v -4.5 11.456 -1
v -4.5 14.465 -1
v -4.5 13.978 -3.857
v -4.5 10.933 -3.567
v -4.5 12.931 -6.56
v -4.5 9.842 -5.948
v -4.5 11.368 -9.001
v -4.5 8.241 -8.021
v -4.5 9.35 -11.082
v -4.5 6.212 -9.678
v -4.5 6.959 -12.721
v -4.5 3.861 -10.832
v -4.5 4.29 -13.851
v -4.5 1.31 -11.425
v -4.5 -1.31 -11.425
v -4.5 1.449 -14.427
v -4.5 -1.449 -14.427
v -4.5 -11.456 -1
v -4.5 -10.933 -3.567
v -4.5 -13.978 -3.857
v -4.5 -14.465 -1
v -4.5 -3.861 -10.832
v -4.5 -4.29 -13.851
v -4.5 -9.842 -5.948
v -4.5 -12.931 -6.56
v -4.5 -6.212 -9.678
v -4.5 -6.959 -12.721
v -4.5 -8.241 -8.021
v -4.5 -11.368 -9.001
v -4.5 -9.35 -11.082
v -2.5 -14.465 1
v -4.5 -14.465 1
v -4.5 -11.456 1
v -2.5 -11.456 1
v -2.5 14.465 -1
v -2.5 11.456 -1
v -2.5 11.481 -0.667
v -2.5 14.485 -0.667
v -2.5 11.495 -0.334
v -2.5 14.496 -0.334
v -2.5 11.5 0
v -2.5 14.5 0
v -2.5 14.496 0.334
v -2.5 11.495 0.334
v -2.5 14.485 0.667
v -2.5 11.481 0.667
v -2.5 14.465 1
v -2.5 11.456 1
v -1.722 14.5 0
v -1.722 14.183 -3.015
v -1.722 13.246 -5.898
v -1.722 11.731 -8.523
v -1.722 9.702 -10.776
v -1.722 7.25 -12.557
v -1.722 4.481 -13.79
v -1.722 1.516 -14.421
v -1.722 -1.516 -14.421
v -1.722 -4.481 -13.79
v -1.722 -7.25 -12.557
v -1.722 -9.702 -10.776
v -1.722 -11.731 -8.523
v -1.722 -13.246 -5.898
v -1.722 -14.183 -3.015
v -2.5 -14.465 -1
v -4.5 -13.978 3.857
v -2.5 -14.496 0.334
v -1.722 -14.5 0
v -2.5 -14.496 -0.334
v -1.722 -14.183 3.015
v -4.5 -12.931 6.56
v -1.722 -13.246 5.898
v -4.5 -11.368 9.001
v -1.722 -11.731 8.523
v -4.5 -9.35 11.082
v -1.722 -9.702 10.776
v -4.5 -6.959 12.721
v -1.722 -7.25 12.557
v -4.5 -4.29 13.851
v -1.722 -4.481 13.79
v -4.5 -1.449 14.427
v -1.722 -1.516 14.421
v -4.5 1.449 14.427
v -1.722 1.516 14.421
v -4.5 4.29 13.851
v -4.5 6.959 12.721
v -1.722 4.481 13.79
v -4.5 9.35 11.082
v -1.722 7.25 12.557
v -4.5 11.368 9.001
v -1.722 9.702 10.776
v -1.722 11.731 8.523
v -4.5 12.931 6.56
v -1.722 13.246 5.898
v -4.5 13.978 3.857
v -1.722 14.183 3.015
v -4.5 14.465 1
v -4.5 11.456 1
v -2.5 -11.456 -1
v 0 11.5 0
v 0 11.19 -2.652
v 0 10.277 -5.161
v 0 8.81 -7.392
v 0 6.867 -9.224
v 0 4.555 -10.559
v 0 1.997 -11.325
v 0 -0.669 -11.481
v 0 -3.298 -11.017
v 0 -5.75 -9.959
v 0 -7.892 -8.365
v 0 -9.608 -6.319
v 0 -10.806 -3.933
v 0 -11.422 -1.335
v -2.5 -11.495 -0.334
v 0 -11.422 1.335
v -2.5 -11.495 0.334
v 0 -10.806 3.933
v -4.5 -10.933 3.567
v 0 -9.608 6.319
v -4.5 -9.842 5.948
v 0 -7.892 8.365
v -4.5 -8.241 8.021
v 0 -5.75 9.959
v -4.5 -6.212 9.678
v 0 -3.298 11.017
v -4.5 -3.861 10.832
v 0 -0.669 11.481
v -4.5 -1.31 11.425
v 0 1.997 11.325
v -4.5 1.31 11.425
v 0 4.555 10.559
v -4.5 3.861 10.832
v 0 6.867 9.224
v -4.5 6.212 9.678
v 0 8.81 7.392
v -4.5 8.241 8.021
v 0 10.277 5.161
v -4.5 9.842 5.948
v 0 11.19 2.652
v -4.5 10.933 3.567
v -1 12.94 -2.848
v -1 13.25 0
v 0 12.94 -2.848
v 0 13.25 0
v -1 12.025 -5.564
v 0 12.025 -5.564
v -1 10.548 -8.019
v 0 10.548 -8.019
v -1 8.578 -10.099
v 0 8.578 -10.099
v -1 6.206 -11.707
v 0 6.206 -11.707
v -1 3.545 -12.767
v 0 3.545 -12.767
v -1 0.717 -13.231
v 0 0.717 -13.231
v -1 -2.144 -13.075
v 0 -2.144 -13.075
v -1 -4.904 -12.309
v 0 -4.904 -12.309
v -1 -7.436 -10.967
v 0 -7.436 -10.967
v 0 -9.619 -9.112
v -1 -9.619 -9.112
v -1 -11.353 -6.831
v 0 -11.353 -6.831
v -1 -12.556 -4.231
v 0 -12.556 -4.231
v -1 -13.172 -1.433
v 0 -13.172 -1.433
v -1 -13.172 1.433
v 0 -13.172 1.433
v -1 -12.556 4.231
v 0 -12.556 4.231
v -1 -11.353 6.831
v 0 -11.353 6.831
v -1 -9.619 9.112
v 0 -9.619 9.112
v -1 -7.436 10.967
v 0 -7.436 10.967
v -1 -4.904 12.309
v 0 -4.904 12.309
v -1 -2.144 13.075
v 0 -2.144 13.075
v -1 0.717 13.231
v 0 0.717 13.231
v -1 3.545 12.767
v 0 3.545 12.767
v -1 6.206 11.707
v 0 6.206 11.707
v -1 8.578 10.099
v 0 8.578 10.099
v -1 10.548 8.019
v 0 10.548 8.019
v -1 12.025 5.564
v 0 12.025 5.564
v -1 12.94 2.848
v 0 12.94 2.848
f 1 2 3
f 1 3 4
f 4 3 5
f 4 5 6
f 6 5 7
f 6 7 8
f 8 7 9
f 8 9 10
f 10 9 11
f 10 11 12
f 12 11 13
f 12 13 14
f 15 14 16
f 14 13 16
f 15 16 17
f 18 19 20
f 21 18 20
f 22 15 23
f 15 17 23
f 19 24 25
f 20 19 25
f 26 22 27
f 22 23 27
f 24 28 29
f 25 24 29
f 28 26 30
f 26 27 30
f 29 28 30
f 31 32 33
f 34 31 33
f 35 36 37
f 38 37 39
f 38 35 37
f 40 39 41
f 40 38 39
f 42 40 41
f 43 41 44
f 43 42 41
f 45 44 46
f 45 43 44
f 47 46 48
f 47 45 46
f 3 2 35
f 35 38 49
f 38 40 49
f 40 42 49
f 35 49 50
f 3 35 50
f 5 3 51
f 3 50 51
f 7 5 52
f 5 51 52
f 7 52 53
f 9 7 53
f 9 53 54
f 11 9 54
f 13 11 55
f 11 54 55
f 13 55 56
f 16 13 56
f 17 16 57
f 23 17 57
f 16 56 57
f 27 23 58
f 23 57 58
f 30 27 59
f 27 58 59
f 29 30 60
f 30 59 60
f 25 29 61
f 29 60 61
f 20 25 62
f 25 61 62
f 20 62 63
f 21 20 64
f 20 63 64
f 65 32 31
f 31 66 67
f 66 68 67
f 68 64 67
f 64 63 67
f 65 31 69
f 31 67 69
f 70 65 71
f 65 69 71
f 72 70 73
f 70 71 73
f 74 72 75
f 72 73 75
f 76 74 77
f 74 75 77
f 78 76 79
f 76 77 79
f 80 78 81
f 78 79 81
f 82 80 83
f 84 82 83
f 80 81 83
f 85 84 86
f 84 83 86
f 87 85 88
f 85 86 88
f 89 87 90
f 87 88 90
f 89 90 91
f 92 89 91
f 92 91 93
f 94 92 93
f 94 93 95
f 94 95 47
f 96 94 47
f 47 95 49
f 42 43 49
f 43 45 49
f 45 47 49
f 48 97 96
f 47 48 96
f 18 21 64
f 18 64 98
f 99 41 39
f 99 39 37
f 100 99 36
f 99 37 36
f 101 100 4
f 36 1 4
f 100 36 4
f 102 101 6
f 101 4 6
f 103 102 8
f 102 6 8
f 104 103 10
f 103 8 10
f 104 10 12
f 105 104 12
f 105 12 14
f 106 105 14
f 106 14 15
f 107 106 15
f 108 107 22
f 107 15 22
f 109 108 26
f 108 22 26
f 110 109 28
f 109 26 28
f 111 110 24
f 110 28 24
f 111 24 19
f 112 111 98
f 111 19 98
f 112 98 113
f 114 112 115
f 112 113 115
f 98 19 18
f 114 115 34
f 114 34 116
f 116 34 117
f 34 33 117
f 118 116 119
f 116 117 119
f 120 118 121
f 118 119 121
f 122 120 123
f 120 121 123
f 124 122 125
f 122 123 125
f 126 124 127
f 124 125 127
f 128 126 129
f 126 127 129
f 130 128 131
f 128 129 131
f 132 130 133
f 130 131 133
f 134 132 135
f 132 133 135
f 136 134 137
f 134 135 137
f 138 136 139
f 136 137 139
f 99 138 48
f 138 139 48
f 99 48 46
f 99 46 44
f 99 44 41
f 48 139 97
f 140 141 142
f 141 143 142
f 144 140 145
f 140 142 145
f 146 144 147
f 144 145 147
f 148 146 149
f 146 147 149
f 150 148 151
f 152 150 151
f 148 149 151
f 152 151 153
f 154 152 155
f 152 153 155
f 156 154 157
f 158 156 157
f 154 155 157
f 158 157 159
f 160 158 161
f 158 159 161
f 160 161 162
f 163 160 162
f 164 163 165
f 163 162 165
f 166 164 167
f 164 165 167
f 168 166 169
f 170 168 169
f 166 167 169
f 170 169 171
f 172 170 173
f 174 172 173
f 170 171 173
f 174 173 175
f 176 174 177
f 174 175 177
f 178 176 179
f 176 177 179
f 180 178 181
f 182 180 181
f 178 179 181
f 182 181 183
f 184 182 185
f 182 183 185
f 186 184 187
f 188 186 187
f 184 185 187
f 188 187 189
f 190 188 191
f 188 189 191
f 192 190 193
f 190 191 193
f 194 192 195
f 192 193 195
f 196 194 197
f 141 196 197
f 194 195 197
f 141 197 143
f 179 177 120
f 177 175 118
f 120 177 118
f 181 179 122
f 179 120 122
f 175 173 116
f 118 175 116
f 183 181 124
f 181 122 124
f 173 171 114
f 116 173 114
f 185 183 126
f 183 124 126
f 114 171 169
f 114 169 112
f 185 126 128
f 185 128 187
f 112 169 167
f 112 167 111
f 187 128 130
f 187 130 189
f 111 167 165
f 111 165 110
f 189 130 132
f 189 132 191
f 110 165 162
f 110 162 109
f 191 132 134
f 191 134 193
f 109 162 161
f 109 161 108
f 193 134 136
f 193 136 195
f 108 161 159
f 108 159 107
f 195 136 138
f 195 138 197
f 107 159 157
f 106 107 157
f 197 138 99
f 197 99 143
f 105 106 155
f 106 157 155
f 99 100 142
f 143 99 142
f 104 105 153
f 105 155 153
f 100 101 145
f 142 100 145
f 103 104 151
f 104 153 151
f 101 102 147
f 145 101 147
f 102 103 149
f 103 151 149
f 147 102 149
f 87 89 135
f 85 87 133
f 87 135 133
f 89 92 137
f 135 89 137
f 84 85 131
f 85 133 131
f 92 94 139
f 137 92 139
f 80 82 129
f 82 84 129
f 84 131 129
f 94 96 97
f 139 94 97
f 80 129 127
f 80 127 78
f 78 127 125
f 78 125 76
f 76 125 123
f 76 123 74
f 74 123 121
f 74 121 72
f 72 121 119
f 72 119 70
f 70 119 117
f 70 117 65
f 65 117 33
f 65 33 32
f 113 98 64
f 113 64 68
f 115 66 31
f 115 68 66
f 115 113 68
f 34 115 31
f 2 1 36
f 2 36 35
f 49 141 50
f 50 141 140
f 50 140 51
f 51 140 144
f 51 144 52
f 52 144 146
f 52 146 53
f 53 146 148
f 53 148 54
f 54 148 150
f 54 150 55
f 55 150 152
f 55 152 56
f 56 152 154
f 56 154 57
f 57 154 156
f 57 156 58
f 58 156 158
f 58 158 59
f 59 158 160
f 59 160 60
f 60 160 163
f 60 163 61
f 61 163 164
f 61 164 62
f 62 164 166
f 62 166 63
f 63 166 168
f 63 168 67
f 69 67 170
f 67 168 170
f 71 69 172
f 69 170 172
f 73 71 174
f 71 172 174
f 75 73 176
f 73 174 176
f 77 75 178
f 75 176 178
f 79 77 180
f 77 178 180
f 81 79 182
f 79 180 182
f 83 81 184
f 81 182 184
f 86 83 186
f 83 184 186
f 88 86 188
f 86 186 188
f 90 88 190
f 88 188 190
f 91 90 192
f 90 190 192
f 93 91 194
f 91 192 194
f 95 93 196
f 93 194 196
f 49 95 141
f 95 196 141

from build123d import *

# Parameters (mm, degrees)
SKETCH2_W          = 2
SKETCH2_H          = 29.895029915
CUT_EXTRUDE1_DEPTH = 2


with BuildPart() as part:
    # Sketch1 → Base-Revolve (revolve)
    with BuildSketch(Plane.XY):
        Polygon((0, 11.5), (-4.5, 11.5), (-4.5, 14.5), (-1.721687836, 14.5), (-1, 13.25), (0, 13.25), align=None)
    revolve(axis=Axis((0, 0, 0), (-1, 0, 0)))

    # Sketch2 → Cut-Extrude1 (cut)
    with BuildSketch(Plane.ZY.offset(4.5)):
        with Locations((0, -0.110232412)):
            Rectangle(SKETCH2_W, SKETCH2_H)
    extrude(amount=-CUT_EXTRUDE1_DEPTH, mode=Mode.SUBTRACT)


solid = part.part
